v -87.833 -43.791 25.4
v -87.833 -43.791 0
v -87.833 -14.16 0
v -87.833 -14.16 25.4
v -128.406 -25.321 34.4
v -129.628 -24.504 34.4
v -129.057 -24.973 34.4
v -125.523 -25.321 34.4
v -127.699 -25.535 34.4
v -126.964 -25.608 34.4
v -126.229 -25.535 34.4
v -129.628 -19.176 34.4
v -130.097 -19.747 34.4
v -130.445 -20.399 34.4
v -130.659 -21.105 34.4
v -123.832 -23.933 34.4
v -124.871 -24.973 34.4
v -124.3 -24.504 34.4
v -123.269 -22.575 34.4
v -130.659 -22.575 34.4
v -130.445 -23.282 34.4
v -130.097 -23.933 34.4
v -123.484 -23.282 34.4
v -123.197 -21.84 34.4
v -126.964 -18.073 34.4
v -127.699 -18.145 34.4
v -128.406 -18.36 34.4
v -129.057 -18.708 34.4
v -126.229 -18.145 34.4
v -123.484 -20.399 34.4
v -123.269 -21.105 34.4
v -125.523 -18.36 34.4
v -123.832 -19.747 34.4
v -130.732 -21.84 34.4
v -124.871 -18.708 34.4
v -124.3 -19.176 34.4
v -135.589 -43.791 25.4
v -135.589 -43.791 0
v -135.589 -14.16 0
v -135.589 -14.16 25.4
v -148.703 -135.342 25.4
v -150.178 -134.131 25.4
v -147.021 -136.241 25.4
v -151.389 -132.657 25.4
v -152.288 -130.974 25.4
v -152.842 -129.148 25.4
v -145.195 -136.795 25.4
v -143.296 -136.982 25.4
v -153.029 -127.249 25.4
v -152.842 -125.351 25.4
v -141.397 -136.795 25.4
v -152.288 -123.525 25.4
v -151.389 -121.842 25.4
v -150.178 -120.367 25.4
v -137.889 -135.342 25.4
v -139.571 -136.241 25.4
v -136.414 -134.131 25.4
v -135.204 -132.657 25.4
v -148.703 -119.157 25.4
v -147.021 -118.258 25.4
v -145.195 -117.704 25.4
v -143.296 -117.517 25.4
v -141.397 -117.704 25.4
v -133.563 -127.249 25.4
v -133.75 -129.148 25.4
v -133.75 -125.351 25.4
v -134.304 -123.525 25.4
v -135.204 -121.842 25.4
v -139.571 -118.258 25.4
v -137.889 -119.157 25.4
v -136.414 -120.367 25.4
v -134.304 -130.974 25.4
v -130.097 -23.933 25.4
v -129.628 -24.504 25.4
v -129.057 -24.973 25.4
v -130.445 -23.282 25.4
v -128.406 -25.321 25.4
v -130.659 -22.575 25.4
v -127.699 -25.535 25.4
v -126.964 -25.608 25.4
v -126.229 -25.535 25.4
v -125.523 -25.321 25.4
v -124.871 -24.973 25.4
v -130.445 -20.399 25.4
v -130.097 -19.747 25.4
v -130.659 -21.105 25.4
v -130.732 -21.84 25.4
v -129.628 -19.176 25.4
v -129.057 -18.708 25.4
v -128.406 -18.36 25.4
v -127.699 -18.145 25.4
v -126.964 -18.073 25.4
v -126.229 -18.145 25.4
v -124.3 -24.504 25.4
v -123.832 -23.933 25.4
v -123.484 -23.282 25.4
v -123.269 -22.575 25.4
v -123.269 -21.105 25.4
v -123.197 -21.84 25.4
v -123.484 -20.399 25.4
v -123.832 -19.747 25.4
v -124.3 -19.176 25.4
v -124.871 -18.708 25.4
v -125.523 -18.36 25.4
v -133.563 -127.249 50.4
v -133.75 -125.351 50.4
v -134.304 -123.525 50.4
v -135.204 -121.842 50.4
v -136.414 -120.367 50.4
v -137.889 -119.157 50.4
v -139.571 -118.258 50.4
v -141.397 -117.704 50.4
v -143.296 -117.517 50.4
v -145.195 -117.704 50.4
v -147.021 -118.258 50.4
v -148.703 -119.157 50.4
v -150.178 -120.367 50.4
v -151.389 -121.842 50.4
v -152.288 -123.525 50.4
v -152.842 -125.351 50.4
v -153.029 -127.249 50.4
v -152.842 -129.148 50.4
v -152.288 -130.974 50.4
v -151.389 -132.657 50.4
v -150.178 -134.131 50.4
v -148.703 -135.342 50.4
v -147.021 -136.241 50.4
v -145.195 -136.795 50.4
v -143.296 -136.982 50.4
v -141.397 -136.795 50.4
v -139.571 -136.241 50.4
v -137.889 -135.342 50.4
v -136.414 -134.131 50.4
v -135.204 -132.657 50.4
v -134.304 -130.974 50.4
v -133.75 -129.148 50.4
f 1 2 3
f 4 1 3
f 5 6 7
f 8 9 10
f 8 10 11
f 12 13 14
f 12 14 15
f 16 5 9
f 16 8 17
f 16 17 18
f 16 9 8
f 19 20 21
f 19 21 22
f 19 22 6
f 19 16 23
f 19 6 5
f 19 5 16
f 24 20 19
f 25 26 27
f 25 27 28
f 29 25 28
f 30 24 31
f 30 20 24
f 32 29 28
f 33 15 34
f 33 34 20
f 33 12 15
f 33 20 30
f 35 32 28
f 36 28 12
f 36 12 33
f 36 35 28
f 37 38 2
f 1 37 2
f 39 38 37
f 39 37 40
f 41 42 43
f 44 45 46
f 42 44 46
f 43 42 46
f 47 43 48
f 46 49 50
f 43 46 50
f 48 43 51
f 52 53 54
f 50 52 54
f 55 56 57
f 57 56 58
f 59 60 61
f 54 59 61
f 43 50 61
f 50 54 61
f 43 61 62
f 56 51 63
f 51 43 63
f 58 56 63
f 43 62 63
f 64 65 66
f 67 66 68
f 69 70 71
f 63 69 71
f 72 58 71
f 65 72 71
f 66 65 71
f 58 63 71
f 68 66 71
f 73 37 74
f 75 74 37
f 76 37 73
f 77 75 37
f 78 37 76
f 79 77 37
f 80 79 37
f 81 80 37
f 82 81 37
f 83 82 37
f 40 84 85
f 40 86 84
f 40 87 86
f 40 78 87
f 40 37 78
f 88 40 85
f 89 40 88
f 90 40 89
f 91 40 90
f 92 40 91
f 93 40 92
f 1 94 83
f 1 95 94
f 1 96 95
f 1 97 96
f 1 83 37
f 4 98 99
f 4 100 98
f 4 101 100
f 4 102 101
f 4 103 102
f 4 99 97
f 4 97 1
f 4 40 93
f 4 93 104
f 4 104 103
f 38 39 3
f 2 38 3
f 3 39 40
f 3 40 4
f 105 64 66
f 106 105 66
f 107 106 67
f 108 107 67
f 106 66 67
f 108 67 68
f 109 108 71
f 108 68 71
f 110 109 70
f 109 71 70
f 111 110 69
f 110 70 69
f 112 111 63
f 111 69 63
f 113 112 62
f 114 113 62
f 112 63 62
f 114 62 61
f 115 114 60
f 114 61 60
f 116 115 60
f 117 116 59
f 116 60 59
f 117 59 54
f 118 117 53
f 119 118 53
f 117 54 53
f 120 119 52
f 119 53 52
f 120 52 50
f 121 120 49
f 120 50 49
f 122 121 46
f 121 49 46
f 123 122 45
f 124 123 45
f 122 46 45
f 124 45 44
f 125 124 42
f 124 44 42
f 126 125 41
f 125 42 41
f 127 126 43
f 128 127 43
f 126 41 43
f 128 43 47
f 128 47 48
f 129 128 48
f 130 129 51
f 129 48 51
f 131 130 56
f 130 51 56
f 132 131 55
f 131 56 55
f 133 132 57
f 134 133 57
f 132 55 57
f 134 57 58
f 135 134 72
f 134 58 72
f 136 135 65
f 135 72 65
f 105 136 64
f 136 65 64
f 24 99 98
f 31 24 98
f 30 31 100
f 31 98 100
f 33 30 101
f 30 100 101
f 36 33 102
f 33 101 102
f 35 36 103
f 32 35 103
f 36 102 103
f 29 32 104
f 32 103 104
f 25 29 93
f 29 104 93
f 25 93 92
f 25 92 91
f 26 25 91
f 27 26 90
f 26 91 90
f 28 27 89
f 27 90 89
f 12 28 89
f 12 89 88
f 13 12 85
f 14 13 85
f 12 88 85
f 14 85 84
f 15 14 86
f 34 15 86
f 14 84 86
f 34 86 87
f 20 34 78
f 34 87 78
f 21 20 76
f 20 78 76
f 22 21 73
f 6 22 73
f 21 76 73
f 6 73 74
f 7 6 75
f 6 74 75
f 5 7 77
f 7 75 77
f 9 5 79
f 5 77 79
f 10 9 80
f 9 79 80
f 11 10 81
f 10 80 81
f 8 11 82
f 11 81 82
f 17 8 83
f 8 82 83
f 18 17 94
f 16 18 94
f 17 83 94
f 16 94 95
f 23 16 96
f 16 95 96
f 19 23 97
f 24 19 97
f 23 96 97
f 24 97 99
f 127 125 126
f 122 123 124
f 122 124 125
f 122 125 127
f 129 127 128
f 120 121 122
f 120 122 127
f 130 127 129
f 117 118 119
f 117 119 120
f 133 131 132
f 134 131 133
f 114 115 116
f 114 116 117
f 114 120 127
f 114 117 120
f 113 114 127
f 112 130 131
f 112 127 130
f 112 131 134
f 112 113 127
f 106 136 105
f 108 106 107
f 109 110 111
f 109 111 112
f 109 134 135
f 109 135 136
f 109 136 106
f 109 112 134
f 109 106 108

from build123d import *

# Parameters (mm, degrees)
F0_W     = 47.756113
F0_H     = 29.631158
F1_DEPTH = 25.4
F2_R     = 9.732717
F3_DEPTH = 25
F5_R     = 3.767377
F6_DEPTH = 9


with BuildPart() as f1:
    # F0 (on Top) → F1 (new body)
    with BuildSketch(Plane.XY):
        with Locations((-111.711125, -28.975875)):
            Rectangle(F0_W, F0_H)
    extrude(amount=F1_DEPTH)

    # F5 (on face) → F6 (join)
    with BuildSketch(Plane.XY.offset(25.4)):
        with Locations((-126.96442, -21.840308)):
            Circle(F5_R)
    extrude(amount=F6_DEPTH)


with BuildPart() as f3:
    # F2 (on face) → F3 (new body)
    with BuildSketch(Plane.XY.offset(25.4)):
        with Locations((-143.296048, -127.249405)):
            Circle(F2_R)
    extrude(amount=F3_DEPTH)


solid = Compound([f1.part, f3.part])
